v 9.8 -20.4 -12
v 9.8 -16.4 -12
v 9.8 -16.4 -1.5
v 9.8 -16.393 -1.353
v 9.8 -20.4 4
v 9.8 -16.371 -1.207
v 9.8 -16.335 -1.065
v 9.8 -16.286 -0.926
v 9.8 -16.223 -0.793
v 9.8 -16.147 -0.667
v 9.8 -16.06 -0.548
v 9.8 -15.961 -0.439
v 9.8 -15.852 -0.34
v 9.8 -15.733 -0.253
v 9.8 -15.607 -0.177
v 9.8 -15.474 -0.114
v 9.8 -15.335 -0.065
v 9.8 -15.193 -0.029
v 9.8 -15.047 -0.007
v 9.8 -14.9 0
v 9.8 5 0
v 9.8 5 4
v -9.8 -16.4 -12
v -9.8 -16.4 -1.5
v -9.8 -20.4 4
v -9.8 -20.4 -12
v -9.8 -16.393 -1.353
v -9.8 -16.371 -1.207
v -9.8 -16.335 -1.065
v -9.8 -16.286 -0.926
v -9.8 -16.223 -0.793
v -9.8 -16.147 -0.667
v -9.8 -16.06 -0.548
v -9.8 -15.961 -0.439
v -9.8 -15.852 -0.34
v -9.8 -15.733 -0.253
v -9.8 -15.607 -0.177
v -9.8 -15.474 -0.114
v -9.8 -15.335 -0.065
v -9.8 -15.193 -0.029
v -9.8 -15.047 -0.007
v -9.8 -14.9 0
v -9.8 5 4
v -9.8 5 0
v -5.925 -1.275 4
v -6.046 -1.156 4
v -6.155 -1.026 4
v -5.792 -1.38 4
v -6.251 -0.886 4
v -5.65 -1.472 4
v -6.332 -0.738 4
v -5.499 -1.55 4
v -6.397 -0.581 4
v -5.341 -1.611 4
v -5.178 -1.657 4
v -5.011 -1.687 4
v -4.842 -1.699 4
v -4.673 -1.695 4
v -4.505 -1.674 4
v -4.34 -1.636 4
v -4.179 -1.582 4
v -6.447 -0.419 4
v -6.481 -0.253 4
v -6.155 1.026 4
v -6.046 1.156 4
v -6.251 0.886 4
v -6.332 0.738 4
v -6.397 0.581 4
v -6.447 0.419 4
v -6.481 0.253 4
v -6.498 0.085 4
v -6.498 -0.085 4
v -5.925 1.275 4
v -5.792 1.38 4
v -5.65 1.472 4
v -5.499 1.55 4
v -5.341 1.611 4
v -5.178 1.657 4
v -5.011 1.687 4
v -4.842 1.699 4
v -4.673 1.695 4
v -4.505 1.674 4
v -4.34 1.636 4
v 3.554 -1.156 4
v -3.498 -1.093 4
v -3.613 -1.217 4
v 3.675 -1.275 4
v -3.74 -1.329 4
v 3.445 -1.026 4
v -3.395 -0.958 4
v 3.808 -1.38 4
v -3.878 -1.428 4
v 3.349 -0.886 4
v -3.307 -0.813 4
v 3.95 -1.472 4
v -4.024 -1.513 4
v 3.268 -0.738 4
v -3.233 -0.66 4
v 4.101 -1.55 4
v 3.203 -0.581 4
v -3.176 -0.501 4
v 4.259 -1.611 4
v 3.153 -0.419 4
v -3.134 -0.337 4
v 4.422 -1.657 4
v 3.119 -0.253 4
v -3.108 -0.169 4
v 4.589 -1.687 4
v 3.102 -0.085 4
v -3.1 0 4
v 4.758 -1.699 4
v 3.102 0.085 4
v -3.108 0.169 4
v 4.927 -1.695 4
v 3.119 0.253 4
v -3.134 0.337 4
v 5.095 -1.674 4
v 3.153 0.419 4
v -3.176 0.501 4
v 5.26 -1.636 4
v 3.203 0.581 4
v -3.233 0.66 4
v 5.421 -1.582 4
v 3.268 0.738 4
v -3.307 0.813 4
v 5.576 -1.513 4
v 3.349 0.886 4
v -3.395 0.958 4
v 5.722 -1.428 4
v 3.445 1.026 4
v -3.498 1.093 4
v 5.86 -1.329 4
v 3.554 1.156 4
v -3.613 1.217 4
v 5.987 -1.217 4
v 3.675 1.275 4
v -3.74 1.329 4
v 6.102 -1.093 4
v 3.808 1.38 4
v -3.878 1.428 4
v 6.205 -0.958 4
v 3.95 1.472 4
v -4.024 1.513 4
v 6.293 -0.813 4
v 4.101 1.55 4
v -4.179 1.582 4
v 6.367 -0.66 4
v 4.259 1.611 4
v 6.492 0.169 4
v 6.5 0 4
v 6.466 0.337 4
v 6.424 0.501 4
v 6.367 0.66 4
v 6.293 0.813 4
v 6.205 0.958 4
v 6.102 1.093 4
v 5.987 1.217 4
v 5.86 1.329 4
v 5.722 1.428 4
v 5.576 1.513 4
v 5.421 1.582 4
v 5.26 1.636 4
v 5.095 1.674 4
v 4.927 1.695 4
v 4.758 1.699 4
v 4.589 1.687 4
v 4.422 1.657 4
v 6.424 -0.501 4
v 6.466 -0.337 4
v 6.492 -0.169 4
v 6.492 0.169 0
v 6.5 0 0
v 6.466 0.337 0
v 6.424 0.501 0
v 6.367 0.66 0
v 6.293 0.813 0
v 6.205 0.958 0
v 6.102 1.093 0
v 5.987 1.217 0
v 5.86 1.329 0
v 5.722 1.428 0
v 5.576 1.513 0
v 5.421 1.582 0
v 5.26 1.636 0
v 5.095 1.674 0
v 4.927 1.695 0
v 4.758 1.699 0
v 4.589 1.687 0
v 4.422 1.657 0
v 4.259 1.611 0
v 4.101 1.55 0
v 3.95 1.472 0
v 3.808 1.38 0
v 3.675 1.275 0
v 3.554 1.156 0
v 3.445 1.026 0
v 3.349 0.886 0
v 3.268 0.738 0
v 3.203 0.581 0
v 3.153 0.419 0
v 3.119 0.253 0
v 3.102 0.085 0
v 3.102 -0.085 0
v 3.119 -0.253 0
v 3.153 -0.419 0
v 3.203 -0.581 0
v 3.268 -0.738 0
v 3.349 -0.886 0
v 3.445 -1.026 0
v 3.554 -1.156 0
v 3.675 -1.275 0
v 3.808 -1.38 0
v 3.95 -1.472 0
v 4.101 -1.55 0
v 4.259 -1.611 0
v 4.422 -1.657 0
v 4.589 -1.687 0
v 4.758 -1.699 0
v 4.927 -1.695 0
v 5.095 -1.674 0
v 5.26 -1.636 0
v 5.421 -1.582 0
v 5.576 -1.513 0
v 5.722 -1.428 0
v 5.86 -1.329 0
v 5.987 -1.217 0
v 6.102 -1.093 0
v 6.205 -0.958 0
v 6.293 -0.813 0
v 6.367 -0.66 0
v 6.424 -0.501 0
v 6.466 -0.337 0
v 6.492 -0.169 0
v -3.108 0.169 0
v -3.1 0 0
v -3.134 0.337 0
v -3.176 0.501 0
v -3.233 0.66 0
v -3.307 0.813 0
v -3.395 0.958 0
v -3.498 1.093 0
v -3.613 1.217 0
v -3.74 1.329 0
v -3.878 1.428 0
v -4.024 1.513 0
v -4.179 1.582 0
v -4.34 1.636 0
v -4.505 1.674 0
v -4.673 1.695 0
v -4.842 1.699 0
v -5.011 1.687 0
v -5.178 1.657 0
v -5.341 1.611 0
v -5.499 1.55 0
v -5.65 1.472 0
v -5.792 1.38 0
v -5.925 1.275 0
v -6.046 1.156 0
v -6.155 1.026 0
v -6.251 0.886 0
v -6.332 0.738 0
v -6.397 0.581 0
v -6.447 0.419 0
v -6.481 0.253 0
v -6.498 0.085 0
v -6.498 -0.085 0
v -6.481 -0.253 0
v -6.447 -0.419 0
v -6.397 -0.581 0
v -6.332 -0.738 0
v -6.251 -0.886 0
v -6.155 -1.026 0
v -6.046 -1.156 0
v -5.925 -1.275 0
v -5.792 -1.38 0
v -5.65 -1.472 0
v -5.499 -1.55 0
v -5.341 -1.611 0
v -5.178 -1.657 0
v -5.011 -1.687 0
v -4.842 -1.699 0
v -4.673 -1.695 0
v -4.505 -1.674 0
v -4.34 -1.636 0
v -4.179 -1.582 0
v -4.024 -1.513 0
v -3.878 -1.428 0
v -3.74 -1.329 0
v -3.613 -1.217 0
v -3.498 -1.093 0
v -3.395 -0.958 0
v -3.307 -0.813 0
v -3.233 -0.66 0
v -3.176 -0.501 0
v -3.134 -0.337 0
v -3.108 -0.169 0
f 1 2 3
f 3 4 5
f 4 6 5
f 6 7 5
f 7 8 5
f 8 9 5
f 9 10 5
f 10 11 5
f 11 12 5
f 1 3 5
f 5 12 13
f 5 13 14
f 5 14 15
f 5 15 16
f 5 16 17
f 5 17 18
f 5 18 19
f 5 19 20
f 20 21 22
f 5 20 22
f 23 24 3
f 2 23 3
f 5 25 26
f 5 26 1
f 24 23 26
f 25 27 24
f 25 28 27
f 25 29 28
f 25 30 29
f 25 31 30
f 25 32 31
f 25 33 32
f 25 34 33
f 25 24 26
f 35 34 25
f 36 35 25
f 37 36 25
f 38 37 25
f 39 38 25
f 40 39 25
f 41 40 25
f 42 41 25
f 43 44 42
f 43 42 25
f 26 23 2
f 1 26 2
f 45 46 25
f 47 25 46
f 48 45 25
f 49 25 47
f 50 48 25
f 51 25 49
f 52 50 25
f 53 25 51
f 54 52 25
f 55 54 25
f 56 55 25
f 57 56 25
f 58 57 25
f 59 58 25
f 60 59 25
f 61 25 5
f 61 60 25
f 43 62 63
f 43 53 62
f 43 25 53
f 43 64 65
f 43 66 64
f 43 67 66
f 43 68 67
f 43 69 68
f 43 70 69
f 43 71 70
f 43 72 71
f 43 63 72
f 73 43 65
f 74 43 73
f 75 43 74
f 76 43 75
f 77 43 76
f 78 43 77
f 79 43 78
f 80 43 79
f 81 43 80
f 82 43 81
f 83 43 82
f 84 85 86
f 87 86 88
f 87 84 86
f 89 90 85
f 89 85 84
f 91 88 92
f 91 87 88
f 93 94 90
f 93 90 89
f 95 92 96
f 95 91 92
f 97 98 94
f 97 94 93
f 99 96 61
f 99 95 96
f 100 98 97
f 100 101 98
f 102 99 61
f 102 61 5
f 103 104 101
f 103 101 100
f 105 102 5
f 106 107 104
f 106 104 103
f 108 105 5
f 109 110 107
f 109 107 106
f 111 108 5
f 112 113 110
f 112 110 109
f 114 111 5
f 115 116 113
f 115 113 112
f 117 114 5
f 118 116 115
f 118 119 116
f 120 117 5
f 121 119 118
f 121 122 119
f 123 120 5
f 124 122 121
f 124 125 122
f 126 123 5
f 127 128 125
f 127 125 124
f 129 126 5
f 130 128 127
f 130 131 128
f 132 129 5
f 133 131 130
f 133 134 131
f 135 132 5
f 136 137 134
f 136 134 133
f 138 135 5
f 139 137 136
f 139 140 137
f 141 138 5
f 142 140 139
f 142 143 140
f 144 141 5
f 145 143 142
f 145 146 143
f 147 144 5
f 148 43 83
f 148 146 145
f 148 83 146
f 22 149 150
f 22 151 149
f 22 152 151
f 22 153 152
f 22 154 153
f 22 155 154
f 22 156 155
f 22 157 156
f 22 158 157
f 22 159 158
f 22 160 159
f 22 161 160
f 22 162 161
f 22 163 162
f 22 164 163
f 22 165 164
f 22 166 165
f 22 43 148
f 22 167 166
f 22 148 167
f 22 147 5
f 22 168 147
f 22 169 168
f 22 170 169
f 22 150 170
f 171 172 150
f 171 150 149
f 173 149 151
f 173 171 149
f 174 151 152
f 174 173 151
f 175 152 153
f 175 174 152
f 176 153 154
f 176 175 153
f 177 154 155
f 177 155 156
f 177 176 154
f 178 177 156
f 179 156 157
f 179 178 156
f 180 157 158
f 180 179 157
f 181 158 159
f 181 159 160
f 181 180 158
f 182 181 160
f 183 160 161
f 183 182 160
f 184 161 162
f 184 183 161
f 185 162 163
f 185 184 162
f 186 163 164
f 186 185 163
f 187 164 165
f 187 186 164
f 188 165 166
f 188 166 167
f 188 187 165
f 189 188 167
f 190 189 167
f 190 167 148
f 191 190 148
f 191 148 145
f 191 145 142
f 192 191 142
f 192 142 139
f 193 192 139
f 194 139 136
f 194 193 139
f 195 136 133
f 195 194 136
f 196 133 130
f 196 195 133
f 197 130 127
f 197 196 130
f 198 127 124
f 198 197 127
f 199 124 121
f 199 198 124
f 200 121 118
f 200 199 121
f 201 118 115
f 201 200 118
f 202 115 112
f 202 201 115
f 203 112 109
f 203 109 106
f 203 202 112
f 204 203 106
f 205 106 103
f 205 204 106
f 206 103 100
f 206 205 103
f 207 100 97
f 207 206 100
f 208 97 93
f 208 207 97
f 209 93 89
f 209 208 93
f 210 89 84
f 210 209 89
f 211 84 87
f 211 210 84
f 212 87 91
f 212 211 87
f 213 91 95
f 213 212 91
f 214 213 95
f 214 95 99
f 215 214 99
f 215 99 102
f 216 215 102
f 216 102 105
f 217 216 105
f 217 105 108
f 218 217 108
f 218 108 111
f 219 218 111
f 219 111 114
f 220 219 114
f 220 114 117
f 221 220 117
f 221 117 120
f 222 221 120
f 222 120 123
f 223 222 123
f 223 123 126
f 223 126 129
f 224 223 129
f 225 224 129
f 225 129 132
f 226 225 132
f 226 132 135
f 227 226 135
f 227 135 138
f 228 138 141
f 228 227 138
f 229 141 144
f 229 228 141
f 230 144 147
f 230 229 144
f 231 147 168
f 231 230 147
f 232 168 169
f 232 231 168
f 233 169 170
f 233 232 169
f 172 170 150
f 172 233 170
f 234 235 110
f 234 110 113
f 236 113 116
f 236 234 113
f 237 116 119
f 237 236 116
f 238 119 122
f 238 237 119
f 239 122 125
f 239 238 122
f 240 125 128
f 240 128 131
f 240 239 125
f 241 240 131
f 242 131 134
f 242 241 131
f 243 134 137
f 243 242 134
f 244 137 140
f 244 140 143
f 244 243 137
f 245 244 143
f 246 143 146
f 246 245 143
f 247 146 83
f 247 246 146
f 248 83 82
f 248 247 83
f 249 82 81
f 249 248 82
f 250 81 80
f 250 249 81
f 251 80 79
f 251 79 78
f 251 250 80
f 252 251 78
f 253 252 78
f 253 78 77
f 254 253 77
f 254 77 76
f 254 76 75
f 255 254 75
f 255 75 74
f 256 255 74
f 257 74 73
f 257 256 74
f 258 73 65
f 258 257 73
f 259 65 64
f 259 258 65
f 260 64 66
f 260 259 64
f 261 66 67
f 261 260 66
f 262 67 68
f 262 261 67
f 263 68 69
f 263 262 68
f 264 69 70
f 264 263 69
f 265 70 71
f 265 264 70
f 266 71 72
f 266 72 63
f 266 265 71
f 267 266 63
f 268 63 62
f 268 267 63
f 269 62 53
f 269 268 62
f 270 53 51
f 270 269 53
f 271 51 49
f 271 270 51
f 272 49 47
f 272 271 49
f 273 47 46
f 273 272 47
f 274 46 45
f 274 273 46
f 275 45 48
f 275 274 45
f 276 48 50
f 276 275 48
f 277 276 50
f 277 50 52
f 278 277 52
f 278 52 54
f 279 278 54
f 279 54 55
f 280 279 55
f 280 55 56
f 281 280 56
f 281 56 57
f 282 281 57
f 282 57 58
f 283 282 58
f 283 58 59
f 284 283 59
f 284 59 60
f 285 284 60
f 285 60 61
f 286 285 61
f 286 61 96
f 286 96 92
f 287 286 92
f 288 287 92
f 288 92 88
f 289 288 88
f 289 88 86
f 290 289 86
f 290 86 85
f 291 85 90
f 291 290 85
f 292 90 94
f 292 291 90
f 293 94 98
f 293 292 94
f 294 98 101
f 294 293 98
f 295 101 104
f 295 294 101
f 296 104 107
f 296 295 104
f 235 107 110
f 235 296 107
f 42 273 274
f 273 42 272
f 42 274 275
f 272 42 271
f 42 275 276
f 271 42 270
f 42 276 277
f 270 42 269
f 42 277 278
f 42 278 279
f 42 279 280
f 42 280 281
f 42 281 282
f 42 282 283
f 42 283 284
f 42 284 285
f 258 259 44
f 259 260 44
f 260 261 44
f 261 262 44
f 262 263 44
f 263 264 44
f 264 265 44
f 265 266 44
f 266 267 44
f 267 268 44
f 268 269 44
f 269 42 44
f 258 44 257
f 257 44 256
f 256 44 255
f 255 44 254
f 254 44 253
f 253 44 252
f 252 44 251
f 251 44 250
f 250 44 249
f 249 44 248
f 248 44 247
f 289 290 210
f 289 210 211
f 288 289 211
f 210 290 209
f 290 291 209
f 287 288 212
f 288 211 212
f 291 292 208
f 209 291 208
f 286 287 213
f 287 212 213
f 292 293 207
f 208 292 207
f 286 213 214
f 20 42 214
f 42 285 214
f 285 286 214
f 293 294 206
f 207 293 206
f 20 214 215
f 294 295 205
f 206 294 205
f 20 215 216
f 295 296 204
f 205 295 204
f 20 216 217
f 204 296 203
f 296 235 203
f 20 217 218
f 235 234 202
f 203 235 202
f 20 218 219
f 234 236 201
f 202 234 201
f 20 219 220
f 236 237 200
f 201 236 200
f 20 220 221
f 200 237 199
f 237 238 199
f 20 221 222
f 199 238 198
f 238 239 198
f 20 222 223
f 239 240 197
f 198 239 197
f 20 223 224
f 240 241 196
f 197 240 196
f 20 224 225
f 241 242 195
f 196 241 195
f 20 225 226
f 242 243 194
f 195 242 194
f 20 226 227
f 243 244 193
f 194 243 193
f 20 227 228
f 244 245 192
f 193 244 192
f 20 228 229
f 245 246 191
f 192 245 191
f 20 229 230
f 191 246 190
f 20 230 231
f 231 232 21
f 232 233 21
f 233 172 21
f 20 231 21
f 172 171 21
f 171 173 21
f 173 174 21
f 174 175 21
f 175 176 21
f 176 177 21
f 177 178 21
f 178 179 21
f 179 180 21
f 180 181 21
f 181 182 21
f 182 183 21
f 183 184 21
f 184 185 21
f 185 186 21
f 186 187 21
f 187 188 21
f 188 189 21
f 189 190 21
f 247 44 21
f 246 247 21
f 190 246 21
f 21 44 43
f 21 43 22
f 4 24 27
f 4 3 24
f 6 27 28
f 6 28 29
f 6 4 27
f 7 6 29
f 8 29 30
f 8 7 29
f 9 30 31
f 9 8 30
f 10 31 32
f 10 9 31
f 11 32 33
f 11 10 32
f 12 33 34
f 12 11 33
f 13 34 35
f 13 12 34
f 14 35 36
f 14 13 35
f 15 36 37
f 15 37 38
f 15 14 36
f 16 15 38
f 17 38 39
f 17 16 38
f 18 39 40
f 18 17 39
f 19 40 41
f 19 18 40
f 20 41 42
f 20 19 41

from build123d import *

# Parameters (mm, degrees)
SKETCH1_W           = 19.6
SKETCH1_H           = 21.4
SKETCH1_R           = 1.7
BOSS_EXTRUDE1_DEPTH = 4
SKETCH3_W           = 19.6
SKETCH3_H           = 16
BOSS_EXTRUDE2_DEPTH = 4
FILLET1_R           = 1.5


with BuildPart() as part:
    # Sketch1 → Boss-Extrude1 (new body)
    with BuildSketch(Plane.XY):
        with Locations((0, -5.7)):
            Rectangle(SKETCH1_W, SKETCH1_H)
        with Locations((-4.8, 0)):
            Circle(SKETCH1_R, mode=Mode.SUBTRACT)
        with Locations((4.8, 0)):
            Circle(SKETCH1_R, mode=Mode.SUBTRACT)
    extrude(amount=BOSS_EXTRUDE1_DEPTH)

    # Sketch3 → Boss-Extrude2 (add)
    with BuildSketch(Plane.XZ.offset(16.4)):
        with Locations((0, -4)):
            Rectangle(SKETCH3_W, SKETCH3_H)
    extrude(amount=BOSS_EXTRUDE2_DEPTH)

    # Fillet1
    fillet1_edges = [part.edges().sort_by_distance(p)[0] for p in [
        (0, -16.4, 0),
    ]]
    fillet(fillet1_edges, radius=FILLET1_R)


solid = part.part
